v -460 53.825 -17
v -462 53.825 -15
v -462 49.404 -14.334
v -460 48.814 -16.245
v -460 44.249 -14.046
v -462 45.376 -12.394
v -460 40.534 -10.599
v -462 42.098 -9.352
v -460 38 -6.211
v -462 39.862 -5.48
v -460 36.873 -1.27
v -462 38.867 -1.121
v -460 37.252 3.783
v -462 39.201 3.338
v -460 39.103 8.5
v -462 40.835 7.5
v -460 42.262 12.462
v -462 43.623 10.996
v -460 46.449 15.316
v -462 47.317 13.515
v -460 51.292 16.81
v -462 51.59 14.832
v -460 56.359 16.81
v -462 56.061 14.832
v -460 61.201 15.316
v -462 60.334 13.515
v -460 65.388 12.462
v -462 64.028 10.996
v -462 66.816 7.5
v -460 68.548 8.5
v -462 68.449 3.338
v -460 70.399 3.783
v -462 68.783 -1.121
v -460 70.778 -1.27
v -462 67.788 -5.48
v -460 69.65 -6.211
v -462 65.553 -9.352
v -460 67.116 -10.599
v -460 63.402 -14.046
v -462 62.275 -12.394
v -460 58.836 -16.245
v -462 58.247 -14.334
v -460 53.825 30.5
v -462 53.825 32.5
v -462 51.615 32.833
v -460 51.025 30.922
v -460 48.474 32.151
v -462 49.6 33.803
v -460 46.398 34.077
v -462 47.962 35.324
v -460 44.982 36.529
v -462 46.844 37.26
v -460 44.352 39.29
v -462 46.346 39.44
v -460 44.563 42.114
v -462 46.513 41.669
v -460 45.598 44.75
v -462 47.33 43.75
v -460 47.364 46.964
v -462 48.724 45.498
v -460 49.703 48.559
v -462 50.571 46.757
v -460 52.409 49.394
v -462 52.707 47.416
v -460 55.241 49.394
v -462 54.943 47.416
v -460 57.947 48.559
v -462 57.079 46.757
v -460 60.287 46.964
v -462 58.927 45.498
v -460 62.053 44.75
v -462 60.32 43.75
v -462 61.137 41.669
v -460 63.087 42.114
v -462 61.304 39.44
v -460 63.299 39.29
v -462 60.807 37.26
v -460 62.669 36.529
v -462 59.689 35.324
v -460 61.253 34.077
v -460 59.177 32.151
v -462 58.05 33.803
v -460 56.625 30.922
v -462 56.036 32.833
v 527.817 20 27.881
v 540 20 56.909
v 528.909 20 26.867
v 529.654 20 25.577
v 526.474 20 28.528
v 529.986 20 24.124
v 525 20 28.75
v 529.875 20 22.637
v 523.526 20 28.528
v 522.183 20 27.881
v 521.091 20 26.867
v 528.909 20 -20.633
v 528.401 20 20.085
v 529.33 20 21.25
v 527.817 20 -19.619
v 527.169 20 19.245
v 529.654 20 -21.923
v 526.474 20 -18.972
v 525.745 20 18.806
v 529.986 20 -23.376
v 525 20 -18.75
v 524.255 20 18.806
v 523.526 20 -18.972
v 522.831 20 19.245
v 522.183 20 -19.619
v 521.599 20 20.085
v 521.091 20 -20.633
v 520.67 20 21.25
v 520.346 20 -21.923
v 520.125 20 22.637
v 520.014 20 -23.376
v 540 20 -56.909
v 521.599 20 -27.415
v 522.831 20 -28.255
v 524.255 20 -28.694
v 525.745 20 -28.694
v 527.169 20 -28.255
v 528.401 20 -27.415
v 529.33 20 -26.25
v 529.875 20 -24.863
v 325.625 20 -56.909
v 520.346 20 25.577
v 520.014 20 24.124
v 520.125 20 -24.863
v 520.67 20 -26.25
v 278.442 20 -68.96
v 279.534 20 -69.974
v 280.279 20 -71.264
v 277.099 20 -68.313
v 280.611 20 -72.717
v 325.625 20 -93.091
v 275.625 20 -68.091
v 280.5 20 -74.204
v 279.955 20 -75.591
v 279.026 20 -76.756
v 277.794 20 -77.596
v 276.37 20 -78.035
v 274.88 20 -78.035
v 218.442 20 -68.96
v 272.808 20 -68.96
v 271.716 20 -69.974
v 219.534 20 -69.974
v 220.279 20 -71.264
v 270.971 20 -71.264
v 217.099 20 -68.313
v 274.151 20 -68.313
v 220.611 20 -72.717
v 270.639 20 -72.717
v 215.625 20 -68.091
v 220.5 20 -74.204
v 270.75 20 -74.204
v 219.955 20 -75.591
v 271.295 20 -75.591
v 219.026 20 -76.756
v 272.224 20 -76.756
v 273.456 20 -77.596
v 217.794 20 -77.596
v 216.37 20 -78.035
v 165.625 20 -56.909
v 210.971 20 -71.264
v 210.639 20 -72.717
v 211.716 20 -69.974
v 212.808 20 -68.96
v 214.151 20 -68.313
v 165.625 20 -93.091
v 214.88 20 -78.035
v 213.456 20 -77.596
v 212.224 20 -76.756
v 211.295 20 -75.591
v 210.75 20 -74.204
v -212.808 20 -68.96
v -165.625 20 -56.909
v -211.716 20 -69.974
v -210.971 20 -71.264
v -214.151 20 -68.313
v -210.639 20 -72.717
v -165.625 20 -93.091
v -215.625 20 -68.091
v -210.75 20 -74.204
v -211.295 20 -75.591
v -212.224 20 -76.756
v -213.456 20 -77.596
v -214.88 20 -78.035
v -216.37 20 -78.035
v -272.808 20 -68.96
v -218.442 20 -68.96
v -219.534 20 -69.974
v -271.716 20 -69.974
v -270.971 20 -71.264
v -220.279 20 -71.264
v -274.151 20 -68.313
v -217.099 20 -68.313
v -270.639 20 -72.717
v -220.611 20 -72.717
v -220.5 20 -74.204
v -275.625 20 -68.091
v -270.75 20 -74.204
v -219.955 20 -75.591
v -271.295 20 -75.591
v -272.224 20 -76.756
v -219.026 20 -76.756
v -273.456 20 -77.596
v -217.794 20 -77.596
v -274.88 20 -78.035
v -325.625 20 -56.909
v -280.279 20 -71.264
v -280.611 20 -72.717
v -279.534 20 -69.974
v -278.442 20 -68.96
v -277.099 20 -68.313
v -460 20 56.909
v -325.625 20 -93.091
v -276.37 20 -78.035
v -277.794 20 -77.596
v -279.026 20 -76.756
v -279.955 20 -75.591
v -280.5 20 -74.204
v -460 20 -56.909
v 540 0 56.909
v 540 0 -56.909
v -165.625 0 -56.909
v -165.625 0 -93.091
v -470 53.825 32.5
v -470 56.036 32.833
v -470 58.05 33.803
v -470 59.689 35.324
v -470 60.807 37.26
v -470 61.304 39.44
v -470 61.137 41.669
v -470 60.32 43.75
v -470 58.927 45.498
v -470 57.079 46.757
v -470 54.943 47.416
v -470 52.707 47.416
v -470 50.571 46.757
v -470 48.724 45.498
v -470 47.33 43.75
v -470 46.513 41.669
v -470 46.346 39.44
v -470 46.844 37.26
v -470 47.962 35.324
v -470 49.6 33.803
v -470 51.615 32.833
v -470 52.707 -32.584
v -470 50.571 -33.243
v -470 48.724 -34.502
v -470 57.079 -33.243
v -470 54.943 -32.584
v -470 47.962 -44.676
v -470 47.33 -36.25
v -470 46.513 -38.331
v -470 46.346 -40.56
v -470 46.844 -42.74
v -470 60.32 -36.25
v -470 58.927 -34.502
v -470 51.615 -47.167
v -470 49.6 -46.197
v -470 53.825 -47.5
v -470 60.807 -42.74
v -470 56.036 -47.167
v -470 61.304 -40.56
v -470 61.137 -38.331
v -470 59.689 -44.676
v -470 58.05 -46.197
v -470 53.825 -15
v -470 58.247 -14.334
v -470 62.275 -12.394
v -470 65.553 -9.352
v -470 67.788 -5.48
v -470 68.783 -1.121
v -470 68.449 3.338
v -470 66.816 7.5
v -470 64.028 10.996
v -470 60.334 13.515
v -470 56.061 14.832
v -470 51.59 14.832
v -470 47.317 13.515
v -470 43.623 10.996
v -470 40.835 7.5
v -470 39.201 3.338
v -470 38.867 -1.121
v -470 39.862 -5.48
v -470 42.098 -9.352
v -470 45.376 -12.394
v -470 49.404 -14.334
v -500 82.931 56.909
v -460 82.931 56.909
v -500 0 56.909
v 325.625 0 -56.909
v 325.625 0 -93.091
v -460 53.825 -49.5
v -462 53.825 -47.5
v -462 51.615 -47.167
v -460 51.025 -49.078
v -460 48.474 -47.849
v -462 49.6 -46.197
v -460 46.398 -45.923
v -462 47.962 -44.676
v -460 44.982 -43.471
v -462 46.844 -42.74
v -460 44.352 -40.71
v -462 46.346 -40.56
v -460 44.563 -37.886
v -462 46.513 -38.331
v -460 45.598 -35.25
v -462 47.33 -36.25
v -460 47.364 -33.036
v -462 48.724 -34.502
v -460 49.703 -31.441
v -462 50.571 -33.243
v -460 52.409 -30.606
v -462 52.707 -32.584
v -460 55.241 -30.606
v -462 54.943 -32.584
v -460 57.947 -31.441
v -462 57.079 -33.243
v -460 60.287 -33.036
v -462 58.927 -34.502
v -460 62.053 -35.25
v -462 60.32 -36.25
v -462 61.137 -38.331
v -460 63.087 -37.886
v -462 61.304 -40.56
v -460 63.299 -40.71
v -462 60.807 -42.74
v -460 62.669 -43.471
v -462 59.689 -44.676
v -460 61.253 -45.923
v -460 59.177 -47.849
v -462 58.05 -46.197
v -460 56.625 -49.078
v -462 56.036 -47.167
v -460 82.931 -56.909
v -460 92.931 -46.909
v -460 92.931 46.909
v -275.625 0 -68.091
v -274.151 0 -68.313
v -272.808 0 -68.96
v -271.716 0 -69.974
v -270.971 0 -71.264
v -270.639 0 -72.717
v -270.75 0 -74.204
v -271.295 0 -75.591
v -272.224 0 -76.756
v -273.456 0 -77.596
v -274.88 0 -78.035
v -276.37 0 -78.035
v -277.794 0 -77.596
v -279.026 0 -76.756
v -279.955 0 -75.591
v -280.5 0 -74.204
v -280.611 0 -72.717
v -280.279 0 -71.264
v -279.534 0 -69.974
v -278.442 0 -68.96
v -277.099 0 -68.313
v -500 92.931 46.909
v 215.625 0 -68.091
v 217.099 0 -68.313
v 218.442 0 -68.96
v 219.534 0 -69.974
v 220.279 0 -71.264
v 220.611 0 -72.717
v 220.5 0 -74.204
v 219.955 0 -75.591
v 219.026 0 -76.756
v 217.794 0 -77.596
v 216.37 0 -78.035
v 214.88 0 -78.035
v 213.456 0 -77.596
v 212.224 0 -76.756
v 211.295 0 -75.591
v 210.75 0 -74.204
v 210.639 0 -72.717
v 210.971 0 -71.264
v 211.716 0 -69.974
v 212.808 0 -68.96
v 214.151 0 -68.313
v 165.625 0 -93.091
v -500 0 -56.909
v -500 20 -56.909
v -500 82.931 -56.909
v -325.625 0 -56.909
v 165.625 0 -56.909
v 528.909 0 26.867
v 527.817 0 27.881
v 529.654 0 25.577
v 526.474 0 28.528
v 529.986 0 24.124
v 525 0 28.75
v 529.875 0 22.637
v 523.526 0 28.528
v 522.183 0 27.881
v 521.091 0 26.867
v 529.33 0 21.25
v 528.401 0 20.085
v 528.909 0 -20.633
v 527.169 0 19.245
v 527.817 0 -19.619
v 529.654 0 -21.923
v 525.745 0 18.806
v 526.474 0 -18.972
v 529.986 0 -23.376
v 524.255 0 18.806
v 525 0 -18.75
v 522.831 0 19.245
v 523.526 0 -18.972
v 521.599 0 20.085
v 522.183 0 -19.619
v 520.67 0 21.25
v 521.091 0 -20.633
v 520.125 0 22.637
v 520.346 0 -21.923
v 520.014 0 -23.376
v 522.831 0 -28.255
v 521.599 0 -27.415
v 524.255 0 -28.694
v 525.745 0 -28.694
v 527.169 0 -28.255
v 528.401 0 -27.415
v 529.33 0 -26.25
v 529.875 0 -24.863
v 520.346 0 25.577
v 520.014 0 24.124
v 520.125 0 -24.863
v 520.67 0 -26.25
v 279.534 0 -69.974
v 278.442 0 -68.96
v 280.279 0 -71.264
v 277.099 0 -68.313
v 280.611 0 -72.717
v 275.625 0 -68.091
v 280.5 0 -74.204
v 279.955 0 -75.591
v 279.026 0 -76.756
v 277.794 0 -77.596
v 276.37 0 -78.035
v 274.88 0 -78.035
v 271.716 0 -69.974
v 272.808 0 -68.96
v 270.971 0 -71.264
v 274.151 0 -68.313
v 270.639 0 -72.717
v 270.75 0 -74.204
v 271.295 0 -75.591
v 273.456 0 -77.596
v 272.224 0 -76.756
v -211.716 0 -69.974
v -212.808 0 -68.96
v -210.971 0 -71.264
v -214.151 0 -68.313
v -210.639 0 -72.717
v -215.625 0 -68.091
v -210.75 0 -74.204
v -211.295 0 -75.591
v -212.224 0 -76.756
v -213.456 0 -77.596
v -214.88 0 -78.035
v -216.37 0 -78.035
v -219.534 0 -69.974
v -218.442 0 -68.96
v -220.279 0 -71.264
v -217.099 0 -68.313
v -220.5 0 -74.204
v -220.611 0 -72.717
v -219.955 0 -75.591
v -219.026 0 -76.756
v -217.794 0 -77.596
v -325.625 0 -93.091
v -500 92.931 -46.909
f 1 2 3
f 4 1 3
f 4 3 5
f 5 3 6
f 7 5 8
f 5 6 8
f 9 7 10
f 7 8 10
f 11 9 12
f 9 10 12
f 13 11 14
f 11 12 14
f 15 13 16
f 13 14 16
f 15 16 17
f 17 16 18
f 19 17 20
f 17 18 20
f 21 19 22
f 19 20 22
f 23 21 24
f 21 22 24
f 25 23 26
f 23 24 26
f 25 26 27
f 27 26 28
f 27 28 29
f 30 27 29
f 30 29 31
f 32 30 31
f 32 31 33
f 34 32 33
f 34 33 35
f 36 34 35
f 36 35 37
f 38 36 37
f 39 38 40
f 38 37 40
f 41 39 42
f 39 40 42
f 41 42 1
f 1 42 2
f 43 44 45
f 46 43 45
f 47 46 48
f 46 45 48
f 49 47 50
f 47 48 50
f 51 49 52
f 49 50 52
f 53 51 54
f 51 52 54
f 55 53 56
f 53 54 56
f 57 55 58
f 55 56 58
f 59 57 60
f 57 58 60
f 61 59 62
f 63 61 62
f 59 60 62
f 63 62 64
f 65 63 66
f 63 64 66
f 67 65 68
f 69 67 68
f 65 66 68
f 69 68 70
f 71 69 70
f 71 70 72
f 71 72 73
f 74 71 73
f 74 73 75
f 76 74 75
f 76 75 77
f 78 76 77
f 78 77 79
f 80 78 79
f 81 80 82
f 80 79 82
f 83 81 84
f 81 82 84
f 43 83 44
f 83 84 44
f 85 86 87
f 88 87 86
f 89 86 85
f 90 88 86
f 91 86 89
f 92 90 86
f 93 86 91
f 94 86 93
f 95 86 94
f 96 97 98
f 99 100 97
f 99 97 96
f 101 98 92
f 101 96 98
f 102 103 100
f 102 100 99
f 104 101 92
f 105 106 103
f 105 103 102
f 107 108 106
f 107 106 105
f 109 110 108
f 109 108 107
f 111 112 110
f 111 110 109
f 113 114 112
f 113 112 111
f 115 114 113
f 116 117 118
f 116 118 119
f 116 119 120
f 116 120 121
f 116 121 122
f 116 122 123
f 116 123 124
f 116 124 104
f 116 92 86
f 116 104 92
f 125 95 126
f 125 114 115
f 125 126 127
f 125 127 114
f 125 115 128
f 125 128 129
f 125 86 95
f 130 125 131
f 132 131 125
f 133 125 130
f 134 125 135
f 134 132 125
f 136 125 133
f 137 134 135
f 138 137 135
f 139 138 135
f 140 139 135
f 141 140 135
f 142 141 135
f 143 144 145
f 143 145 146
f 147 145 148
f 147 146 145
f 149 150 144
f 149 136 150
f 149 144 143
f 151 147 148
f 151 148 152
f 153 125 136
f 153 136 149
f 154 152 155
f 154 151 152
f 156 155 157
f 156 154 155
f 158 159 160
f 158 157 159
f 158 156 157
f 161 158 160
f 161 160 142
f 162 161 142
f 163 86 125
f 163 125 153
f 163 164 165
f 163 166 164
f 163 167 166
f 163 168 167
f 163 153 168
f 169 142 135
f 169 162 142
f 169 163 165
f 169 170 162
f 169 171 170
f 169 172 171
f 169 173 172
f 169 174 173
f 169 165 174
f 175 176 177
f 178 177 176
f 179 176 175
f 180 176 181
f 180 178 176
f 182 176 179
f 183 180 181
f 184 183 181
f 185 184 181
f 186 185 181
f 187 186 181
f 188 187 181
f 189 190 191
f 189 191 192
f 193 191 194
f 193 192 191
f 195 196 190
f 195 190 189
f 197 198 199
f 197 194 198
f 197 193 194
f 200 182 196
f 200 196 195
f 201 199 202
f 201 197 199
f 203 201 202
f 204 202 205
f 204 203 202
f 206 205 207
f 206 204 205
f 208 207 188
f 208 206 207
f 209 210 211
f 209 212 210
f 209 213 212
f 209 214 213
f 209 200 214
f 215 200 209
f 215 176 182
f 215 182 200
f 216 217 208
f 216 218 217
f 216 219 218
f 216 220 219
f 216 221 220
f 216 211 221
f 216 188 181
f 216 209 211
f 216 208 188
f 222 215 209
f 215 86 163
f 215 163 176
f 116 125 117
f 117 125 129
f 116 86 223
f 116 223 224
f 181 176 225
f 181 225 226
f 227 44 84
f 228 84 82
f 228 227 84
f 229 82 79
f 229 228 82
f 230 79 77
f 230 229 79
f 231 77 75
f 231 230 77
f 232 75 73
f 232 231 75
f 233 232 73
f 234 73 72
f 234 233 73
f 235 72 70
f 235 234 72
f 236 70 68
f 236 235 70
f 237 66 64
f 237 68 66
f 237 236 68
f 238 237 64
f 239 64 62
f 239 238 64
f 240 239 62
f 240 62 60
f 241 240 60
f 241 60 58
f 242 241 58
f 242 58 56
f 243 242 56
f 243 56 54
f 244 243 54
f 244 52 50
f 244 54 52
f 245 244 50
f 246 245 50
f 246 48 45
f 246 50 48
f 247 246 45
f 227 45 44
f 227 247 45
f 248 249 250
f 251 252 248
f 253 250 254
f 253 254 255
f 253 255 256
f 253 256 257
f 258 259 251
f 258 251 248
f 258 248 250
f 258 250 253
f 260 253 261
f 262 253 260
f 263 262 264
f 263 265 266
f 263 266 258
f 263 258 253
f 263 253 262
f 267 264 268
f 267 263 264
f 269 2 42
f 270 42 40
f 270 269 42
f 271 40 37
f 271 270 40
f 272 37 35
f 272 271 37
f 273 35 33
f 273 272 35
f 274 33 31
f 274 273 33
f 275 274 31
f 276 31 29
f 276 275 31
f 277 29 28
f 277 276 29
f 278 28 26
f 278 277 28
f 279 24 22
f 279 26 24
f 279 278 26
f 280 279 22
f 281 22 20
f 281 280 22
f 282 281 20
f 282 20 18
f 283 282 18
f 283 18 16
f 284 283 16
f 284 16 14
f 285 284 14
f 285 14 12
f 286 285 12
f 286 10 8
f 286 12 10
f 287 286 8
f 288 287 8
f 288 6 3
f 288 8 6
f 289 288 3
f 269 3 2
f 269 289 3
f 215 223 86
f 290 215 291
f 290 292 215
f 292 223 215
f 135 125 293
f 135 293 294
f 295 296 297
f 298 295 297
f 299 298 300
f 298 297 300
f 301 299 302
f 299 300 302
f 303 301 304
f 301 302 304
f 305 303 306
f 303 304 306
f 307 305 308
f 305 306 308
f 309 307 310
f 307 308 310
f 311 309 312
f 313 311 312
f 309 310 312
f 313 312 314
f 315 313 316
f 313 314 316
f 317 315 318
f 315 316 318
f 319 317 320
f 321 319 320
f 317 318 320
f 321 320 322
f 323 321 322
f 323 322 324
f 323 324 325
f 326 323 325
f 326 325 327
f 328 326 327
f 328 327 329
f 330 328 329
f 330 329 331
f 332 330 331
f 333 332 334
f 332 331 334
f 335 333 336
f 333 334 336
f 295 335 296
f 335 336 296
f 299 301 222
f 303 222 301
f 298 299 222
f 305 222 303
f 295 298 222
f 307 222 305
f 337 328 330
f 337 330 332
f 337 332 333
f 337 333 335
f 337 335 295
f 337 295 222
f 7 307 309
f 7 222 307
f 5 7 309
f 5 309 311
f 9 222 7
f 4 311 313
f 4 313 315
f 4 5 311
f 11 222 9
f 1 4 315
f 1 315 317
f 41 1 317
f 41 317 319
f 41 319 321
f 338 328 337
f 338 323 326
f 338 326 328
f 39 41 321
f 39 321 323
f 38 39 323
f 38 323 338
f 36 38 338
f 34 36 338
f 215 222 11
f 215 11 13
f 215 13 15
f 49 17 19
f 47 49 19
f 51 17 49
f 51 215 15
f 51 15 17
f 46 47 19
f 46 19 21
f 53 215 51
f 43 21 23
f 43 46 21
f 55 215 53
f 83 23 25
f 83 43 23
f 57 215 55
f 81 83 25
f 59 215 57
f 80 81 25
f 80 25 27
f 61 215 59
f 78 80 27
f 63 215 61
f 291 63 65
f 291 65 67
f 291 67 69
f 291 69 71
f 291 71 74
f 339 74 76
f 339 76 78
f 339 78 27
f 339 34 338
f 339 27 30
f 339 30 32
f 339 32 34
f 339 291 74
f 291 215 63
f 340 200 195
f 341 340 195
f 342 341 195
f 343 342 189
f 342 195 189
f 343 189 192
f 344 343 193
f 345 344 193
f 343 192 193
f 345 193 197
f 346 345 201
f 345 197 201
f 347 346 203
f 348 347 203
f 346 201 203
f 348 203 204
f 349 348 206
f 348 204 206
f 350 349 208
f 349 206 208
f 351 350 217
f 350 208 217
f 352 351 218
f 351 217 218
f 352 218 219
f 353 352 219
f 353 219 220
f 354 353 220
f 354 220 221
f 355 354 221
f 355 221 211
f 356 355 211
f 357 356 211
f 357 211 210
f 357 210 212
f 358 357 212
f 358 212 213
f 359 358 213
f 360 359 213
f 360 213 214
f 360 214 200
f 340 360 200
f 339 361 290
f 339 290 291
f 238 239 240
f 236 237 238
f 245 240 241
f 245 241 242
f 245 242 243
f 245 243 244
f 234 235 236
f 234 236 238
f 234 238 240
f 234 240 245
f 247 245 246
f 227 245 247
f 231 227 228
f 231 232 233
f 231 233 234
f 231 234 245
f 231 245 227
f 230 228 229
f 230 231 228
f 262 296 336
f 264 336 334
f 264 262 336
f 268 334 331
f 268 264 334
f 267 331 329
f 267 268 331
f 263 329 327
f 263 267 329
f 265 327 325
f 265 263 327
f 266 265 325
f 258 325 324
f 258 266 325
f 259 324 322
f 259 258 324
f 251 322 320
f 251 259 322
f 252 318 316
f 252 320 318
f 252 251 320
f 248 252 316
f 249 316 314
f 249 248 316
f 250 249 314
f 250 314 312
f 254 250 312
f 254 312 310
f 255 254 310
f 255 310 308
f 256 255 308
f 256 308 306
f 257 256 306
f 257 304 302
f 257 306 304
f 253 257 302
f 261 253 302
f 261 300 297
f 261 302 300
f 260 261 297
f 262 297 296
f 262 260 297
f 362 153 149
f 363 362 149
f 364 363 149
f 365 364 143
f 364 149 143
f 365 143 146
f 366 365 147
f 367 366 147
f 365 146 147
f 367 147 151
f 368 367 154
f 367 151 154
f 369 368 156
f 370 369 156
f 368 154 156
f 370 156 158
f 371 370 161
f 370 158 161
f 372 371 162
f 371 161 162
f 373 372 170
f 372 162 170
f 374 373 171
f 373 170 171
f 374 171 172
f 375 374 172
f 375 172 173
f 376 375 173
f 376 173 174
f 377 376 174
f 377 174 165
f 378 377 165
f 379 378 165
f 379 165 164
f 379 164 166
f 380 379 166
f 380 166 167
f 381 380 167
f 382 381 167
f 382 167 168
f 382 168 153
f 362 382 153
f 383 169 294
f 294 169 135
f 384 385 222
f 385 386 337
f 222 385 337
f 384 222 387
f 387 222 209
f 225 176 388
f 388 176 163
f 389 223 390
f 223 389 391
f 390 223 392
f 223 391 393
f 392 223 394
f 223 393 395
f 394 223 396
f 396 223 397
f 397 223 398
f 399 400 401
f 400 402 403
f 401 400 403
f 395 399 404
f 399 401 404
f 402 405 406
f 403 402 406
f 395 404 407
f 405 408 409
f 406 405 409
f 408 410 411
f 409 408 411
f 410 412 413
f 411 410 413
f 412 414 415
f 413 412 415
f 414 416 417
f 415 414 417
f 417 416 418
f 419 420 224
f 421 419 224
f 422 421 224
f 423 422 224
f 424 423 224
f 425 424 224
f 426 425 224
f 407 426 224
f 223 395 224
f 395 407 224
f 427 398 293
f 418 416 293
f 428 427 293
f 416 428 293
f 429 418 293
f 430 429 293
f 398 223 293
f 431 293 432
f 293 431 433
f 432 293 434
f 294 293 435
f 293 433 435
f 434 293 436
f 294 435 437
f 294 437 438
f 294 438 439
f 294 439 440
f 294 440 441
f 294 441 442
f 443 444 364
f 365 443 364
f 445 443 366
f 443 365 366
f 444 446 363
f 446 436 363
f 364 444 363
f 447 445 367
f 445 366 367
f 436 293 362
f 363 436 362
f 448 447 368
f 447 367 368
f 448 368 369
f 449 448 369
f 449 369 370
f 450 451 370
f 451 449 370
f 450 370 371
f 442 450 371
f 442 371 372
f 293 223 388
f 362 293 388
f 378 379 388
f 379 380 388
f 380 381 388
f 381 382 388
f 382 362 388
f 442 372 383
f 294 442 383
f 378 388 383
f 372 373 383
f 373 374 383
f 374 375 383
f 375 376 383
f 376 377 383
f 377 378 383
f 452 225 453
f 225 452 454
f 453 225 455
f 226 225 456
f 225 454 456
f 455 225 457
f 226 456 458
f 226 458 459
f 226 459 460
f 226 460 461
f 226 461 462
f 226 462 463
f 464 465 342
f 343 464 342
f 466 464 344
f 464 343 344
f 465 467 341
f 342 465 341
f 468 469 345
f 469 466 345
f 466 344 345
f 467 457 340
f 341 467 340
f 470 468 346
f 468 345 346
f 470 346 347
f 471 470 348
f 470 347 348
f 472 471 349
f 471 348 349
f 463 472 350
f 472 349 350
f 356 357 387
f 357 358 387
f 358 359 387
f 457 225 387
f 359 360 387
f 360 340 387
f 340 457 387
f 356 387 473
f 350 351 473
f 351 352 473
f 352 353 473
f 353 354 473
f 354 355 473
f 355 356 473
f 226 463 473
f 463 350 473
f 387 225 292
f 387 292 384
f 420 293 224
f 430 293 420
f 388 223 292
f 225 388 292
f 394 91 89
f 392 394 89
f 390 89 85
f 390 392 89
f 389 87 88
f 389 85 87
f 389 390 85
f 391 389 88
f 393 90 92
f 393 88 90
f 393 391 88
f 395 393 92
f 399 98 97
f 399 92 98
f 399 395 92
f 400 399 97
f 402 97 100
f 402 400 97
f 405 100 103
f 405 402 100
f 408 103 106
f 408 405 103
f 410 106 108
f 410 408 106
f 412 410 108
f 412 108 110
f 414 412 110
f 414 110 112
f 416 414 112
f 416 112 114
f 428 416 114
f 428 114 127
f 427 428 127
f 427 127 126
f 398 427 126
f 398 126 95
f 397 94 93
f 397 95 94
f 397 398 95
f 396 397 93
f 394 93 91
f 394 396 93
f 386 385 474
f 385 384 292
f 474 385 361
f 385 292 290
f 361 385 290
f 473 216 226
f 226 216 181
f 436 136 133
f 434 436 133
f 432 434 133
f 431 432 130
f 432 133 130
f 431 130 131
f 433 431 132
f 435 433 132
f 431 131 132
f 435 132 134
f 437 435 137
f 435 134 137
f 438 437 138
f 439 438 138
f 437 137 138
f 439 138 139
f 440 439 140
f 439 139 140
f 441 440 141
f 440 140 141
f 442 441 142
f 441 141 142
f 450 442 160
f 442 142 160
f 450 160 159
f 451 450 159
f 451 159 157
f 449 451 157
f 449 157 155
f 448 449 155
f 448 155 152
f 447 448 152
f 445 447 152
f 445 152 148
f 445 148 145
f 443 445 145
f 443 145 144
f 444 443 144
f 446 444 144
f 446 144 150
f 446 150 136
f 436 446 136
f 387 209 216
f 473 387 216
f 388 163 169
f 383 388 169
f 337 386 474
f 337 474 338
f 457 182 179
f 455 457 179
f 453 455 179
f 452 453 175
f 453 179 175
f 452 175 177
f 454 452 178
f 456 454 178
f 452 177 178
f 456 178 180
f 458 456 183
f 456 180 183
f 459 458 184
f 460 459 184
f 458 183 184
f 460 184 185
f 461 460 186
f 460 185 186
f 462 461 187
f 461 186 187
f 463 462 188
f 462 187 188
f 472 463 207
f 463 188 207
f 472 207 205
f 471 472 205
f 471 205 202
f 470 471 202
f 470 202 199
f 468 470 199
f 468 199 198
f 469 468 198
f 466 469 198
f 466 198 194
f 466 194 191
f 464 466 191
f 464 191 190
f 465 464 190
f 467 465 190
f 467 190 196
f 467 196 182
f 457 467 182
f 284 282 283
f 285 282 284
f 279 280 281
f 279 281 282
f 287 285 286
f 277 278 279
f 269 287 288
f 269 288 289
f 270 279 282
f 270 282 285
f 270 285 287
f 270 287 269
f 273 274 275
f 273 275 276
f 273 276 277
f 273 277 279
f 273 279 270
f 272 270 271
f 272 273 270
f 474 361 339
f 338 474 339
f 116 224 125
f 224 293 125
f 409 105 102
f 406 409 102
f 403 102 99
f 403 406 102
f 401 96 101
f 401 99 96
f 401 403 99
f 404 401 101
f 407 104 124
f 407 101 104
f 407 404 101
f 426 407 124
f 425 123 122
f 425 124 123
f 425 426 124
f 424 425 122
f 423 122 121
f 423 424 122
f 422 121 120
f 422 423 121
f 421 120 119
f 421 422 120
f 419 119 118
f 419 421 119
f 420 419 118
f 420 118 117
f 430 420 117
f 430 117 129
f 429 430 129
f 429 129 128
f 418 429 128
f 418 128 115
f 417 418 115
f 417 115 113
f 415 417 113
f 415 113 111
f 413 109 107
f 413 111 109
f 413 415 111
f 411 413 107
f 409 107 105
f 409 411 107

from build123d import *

# Parameters (mm, degrees)
SKETCH_1_W               = 211.216150174
SKETCH_1_H               = 56.943071366
EXTRUDE_1_DEPTH          = 20
SKETCH_2_W               = 1000
SKETCH_2_H               = 113.81790299
EXTRUDE_2_DEPTH          = 20
SKETCH_3_W               = 160
SKETCH_3_H               = 36.18209701
EXTRUDE_3_DEPTH          = 20
SKETCH_4_W               = 160
SKETCH_4_H               = 36.18209701
EXTRUDE_4_DEPTH          = 20
SKETCH_5_W               = 40
SKETCH_5_H               = 72.930561876
EXTRUDE_5_DEPTH          = 113.817902989
CUT_EXTRUDE_1_DEPTH      = 969.969572609
CUT_EXTRUDE_1_DEPTH_BACK = 10
SKETCH_6_R               = 15
SKETCH_6_R_2             = 7.5
SKETCH_7_W               = 113.81790299
SKETCH_7_H               = 20
EXTRUDE_6_DEPTH          = 40
CUT_EXTRUDE_2_DEPTH      = 553.797259551
CUT_EXTRUDE_2_DEPTH_BACK = 553.797259551
SKETCH_8_R               = 5
CHAMFER_1_SIZE           = 10
CHAMFER_2_SIZE           = 2
SKETCH_9_R               = 5
CUT_EXTRUDE_3_DEPTH      = 300


with BuildPart() as part:
    # 草图1 → 凸台-拉伸1 (new body)
    with BuildSketch(Plane(origin=(0, 0, 0), x_dir=(1, 0, 0), z_dir=(0, 1, 0))):
        Rectangle(SKETCH_1_W, SKETCH_1_H)
    extrude(amount=EXTRUDE_1_DEPTH)

    # 草图2 → 凸台-拉伸2 (add)
    with BuildSketch(Plane(origin=(0, 20, 0), x_dir=(1, 0, 0), z_dir=(0, 1, 0))):
        Rectangle(SKETCH_2_W, SKETCH_2_H)
    extrude(amount=-EXTRUDE_2_DEPTH)

    # 草图3 → 凸台-拉伸3 (add)
    with BuildSketch(Plane(origin=(0, 20, 0), x_dir=(1, 0, 0), z_dir=(0, 1, 0))):
        with Locations((-245.625, 75)):
            Rectangle(SKETCH_3_W, SKETCH_3_H)
    extrude(amount=-EXTRUDE_3_DEPTH)

    # 草图4 → 凸台-拉伸4 (add)
    with BuildSketch(Plane(origin=(0, 20, 0), x_dir=(1, 0, 0), z_dir=(0, 1, 0))):
        with Locations((245.625, 75)):
            Rectangle(SKETCH_4_W, SKETCH_4_H)
    extrude(amount=-EXTRUDE_4_DEPTH)

    # 草图5 → 凸台-拉伸5 (add)
    with BuildSketch(Plane.XY.offset(56.908951495)):
        with Locations((-480, 56.465280938)):
            Rectangle(SKETCH_5_W, SKETCH_5_H)
    extrude(amount=-EXTRUDE_5_DEPTH)

    # 草图6 → 切除-拉伸1 (cut, two sides: drawn at the far end of the back side and taken through both)
    with BuildSketch(Plane(origin=(-460, 0, 0), x_dir=(0, 0, -1), z_dir=(1, 0, 0)).offset(-CUT_EXTRUDE_1_DEPTH_BACK)):
        with Locations((0, 53.825309314)):
            Circle(SKETCH_6_R)
        with Locations((40, 53.825309314)):
            Circle(SKETCH_6_R_2)
        with Locations((-40, 53.825309314)):
            Circle(SKETCH_6_R_2)
    extrude(amount=CUT_EXTRUDE_1_DEPTH + CUT_EXTRUDE_1_DEPTH_BACK, mode=Mode.SUBTRACT)

    # 草图7 → 凸台-拉伸6 (add)
    with BuildSketch(Plane(origin=(500, 0, 0), x_dir=(0, 0, -1), z_dir=(1, 0, 0))):
        with Locations((0, 10)):
            Rectangle(SKETCH_7_W, SKETCH_7_H)
    extrude(amount=EXTRUDE_6_DEPTH)

    # 草图8 → 切除-拉伸2 (cut, two sides: drawn at the far end of the back side and taken through both)
    with BuildSketch(Plane(origin=(0, 20, 0), x_dir=(1, 0, 0), z_dir=(0, 1, 0)).offset(-CUT_EXTRUDE_2_DEPTH_BACK)):
        with Locations(Location((525, 23.75, 0), (0, 0, 270))):
            Circle(SKETCH_8_R)
        with Locations(Location((525, -23.75, 0), (0, 0, 270))):
            Circle(SKETCH_8_R)
    extrude(amount=CUT_EXTRUDE_2_DEPTH + CUT_EXTRUDE_2_DEPTH_BACK, mode=Mode.SUBTRACT)

    # 倒角1
    chamfer_1_edges = [part.edges().sort_by_distance(p)[0] for p in [
        (-480, 92.930561876, 56.908951495),
        (-480, 92.930561876, -56.908951494),
    ]]
    chamfer(chamfer_1_edges, length=CHAMFER_1_SIZE)

    # 倒角2
    chamfer_2_edges = [part.edges().sort_by_distance(p)[0] for p in [
        (-460, 53.825309314, 47.5),
        (-460, 53.825309314, -32.5),
        (-460, 53.825309314, 15),
    ]]
    chamfer(chamfer_2_edges, length=CHAMFER_2_SIZE)

    # 草图9 → 切除-拉伸3 (cut)
    with BuildSketch(Plane(origin=(0, 20, 0), x_dir=(1, 0, 0), z_dir=(0, 1, 0))):
        with Locations(Location((-275.625, 73.091048505, 0), (0, 0, 270))):
            Circle(SKETCH_9_R)
        with Locations(Location((-215.625, 73.091048505, 0), (0, 0, 270))):
            Circle(SKETCH_9_R)
        with Locations(Location((215.625, 73.091048505, 0), (0, 0, 270))):
            Circle(SKETCH_9_R)
        with Locations(Location((275.625, 73.091048505, 0), (0, 0, 270))):
            Circle(SKETCH_9_R)
    extrude(amount=-CUT_EXTRUDE_3_DEPTH, mode=Mode.SUBTRACT)


solid = part.part
